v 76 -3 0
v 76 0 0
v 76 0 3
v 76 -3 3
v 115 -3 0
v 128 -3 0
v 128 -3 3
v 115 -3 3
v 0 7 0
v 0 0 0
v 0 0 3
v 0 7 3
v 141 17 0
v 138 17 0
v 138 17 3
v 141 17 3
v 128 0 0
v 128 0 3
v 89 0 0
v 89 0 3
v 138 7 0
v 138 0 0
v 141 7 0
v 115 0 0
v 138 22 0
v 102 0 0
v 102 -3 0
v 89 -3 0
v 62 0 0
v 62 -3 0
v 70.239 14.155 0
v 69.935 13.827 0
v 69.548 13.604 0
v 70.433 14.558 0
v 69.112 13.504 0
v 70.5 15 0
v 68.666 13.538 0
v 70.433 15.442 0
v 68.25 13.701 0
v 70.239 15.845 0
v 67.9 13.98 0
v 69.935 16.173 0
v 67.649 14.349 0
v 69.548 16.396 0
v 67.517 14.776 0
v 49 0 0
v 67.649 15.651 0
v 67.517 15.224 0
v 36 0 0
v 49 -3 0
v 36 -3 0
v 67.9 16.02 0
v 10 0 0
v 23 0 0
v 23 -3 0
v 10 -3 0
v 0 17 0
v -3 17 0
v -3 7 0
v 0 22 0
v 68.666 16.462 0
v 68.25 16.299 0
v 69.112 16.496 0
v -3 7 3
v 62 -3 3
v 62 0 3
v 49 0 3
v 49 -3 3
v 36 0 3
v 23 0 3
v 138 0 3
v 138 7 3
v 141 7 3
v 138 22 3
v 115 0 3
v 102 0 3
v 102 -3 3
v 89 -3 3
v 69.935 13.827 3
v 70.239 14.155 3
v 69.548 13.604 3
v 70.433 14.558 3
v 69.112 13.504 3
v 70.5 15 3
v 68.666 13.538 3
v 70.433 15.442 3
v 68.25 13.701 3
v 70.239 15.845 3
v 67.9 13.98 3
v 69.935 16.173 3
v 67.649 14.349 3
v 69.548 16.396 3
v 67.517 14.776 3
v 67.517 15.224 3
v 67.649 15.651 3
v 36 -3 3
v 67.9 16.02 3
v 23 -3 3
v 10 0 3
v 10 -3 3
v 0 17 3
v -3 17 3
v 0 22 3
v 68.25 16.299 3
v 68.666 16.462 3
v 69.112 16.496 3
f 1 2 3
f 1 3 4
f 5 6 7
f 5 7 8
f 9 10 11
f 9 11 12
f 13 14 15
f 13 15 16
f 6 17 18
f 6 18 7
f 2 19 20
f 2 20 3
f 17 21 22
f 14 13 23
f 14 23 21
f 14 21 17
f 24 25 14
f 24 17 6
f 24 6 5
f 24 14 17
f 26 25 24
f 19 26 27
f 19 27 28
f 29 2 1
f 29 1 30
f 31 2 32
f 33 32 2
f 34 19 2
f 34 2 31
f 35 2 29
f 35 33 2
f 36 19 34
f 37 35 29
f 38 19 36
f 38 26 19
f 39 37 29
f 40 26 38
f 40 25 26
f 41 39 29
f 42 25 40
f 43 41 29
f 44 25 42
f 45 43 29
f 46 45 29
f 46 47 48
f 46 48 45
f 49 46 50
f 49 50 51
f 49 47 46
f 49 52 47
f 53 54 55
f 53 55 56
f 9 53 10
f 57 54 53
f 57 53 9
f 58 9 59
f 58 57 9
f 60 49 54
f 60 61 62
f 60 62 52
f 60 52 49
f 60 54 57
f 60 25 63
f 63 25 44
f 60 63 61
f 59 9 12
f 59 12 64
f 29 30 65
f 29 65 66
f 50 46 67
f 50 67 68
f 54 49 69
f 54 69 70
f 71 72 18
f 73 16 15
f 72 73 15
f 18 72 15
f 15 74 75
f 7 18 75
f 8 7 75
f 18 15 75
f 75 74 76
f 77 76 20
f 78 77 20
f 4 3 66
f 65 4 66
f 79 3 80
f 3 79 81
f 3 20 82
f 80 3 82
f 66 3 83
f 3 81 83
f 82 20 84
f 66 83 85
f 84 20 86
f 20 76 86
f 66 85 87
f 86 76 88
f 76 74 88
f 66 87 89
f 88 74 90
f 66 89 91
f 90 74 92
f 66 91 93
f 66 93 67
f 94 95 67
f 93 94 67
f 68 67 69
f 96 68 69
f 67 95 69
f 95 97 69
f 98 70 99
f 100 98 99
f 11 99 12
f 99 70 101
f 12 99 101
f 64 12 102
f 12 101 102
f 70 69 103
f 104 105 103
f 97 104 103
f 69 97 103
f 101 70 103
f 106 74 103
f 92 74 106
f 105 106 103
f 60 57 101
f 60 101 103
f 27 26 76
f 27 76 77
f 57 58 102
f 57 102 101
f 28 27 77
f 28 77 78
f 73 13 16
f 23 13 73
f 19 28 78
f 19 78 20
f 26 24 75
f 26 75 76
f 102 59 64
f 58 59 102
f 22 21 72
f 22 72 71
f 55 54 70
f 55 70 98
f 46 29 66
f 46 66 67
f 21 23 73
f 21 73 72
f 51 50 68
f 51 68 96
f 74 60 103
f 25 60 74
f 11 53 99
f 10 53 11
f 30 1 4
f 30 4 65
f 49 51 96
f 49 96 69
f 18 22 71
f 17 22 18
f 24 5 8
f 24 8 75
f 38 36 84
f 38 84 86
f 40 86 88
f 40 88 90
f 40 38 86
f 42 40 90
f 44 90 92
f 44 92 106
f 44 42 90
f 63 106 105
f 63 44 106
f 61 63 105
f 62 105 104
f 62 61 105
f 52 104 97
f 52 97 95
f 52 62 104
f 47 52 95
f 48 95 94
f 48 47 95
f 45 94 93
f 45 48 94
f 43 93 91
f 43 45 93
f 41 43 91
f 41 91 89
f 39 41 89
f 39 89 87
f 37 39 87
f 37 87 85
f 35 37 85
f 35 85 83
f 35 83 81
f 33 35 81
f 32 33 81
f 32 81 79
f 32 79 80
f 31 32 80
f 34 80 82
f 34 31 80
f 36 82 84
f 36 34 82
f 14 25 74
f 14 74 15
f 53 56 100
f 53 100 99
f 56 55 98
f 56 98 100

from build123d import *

# Parameters (mm, degrees)
SKETCH1_R           = 1.5
BOSS_EXTRUDE1_DEPTH = 3


with BuildPart() as part:
    # Sketch1 → Boss-Extrude1 (new body)
    with BuildSketch(Plane.XY):
        Polygon((0, 17), (0, 22), (138, 22), (138, 17), (141, 17), (141, 7), (138, 7), (138, 0), (128, 0), (128, -3), (115, -3), (115, 0), (102, 0), (102, -3), (89, -3), (89, 0), (76, 0), (76, -3), (62, -3), (62, 0), (49, 0), (49, -3), (36, -3), (36, 0), (23, 0), (23, -3), (10, -3), (10, 0), (0, 0), (0, 7), (-3, 7), (-3, 17), align=None)
        with Locations((69, 15)):
            Circle(SKETCH1_R, mode=Mode.SUBTRACT)
    extrude(amount=BOSS_EXTRUDE1_DEPTH)


solid = part.part
